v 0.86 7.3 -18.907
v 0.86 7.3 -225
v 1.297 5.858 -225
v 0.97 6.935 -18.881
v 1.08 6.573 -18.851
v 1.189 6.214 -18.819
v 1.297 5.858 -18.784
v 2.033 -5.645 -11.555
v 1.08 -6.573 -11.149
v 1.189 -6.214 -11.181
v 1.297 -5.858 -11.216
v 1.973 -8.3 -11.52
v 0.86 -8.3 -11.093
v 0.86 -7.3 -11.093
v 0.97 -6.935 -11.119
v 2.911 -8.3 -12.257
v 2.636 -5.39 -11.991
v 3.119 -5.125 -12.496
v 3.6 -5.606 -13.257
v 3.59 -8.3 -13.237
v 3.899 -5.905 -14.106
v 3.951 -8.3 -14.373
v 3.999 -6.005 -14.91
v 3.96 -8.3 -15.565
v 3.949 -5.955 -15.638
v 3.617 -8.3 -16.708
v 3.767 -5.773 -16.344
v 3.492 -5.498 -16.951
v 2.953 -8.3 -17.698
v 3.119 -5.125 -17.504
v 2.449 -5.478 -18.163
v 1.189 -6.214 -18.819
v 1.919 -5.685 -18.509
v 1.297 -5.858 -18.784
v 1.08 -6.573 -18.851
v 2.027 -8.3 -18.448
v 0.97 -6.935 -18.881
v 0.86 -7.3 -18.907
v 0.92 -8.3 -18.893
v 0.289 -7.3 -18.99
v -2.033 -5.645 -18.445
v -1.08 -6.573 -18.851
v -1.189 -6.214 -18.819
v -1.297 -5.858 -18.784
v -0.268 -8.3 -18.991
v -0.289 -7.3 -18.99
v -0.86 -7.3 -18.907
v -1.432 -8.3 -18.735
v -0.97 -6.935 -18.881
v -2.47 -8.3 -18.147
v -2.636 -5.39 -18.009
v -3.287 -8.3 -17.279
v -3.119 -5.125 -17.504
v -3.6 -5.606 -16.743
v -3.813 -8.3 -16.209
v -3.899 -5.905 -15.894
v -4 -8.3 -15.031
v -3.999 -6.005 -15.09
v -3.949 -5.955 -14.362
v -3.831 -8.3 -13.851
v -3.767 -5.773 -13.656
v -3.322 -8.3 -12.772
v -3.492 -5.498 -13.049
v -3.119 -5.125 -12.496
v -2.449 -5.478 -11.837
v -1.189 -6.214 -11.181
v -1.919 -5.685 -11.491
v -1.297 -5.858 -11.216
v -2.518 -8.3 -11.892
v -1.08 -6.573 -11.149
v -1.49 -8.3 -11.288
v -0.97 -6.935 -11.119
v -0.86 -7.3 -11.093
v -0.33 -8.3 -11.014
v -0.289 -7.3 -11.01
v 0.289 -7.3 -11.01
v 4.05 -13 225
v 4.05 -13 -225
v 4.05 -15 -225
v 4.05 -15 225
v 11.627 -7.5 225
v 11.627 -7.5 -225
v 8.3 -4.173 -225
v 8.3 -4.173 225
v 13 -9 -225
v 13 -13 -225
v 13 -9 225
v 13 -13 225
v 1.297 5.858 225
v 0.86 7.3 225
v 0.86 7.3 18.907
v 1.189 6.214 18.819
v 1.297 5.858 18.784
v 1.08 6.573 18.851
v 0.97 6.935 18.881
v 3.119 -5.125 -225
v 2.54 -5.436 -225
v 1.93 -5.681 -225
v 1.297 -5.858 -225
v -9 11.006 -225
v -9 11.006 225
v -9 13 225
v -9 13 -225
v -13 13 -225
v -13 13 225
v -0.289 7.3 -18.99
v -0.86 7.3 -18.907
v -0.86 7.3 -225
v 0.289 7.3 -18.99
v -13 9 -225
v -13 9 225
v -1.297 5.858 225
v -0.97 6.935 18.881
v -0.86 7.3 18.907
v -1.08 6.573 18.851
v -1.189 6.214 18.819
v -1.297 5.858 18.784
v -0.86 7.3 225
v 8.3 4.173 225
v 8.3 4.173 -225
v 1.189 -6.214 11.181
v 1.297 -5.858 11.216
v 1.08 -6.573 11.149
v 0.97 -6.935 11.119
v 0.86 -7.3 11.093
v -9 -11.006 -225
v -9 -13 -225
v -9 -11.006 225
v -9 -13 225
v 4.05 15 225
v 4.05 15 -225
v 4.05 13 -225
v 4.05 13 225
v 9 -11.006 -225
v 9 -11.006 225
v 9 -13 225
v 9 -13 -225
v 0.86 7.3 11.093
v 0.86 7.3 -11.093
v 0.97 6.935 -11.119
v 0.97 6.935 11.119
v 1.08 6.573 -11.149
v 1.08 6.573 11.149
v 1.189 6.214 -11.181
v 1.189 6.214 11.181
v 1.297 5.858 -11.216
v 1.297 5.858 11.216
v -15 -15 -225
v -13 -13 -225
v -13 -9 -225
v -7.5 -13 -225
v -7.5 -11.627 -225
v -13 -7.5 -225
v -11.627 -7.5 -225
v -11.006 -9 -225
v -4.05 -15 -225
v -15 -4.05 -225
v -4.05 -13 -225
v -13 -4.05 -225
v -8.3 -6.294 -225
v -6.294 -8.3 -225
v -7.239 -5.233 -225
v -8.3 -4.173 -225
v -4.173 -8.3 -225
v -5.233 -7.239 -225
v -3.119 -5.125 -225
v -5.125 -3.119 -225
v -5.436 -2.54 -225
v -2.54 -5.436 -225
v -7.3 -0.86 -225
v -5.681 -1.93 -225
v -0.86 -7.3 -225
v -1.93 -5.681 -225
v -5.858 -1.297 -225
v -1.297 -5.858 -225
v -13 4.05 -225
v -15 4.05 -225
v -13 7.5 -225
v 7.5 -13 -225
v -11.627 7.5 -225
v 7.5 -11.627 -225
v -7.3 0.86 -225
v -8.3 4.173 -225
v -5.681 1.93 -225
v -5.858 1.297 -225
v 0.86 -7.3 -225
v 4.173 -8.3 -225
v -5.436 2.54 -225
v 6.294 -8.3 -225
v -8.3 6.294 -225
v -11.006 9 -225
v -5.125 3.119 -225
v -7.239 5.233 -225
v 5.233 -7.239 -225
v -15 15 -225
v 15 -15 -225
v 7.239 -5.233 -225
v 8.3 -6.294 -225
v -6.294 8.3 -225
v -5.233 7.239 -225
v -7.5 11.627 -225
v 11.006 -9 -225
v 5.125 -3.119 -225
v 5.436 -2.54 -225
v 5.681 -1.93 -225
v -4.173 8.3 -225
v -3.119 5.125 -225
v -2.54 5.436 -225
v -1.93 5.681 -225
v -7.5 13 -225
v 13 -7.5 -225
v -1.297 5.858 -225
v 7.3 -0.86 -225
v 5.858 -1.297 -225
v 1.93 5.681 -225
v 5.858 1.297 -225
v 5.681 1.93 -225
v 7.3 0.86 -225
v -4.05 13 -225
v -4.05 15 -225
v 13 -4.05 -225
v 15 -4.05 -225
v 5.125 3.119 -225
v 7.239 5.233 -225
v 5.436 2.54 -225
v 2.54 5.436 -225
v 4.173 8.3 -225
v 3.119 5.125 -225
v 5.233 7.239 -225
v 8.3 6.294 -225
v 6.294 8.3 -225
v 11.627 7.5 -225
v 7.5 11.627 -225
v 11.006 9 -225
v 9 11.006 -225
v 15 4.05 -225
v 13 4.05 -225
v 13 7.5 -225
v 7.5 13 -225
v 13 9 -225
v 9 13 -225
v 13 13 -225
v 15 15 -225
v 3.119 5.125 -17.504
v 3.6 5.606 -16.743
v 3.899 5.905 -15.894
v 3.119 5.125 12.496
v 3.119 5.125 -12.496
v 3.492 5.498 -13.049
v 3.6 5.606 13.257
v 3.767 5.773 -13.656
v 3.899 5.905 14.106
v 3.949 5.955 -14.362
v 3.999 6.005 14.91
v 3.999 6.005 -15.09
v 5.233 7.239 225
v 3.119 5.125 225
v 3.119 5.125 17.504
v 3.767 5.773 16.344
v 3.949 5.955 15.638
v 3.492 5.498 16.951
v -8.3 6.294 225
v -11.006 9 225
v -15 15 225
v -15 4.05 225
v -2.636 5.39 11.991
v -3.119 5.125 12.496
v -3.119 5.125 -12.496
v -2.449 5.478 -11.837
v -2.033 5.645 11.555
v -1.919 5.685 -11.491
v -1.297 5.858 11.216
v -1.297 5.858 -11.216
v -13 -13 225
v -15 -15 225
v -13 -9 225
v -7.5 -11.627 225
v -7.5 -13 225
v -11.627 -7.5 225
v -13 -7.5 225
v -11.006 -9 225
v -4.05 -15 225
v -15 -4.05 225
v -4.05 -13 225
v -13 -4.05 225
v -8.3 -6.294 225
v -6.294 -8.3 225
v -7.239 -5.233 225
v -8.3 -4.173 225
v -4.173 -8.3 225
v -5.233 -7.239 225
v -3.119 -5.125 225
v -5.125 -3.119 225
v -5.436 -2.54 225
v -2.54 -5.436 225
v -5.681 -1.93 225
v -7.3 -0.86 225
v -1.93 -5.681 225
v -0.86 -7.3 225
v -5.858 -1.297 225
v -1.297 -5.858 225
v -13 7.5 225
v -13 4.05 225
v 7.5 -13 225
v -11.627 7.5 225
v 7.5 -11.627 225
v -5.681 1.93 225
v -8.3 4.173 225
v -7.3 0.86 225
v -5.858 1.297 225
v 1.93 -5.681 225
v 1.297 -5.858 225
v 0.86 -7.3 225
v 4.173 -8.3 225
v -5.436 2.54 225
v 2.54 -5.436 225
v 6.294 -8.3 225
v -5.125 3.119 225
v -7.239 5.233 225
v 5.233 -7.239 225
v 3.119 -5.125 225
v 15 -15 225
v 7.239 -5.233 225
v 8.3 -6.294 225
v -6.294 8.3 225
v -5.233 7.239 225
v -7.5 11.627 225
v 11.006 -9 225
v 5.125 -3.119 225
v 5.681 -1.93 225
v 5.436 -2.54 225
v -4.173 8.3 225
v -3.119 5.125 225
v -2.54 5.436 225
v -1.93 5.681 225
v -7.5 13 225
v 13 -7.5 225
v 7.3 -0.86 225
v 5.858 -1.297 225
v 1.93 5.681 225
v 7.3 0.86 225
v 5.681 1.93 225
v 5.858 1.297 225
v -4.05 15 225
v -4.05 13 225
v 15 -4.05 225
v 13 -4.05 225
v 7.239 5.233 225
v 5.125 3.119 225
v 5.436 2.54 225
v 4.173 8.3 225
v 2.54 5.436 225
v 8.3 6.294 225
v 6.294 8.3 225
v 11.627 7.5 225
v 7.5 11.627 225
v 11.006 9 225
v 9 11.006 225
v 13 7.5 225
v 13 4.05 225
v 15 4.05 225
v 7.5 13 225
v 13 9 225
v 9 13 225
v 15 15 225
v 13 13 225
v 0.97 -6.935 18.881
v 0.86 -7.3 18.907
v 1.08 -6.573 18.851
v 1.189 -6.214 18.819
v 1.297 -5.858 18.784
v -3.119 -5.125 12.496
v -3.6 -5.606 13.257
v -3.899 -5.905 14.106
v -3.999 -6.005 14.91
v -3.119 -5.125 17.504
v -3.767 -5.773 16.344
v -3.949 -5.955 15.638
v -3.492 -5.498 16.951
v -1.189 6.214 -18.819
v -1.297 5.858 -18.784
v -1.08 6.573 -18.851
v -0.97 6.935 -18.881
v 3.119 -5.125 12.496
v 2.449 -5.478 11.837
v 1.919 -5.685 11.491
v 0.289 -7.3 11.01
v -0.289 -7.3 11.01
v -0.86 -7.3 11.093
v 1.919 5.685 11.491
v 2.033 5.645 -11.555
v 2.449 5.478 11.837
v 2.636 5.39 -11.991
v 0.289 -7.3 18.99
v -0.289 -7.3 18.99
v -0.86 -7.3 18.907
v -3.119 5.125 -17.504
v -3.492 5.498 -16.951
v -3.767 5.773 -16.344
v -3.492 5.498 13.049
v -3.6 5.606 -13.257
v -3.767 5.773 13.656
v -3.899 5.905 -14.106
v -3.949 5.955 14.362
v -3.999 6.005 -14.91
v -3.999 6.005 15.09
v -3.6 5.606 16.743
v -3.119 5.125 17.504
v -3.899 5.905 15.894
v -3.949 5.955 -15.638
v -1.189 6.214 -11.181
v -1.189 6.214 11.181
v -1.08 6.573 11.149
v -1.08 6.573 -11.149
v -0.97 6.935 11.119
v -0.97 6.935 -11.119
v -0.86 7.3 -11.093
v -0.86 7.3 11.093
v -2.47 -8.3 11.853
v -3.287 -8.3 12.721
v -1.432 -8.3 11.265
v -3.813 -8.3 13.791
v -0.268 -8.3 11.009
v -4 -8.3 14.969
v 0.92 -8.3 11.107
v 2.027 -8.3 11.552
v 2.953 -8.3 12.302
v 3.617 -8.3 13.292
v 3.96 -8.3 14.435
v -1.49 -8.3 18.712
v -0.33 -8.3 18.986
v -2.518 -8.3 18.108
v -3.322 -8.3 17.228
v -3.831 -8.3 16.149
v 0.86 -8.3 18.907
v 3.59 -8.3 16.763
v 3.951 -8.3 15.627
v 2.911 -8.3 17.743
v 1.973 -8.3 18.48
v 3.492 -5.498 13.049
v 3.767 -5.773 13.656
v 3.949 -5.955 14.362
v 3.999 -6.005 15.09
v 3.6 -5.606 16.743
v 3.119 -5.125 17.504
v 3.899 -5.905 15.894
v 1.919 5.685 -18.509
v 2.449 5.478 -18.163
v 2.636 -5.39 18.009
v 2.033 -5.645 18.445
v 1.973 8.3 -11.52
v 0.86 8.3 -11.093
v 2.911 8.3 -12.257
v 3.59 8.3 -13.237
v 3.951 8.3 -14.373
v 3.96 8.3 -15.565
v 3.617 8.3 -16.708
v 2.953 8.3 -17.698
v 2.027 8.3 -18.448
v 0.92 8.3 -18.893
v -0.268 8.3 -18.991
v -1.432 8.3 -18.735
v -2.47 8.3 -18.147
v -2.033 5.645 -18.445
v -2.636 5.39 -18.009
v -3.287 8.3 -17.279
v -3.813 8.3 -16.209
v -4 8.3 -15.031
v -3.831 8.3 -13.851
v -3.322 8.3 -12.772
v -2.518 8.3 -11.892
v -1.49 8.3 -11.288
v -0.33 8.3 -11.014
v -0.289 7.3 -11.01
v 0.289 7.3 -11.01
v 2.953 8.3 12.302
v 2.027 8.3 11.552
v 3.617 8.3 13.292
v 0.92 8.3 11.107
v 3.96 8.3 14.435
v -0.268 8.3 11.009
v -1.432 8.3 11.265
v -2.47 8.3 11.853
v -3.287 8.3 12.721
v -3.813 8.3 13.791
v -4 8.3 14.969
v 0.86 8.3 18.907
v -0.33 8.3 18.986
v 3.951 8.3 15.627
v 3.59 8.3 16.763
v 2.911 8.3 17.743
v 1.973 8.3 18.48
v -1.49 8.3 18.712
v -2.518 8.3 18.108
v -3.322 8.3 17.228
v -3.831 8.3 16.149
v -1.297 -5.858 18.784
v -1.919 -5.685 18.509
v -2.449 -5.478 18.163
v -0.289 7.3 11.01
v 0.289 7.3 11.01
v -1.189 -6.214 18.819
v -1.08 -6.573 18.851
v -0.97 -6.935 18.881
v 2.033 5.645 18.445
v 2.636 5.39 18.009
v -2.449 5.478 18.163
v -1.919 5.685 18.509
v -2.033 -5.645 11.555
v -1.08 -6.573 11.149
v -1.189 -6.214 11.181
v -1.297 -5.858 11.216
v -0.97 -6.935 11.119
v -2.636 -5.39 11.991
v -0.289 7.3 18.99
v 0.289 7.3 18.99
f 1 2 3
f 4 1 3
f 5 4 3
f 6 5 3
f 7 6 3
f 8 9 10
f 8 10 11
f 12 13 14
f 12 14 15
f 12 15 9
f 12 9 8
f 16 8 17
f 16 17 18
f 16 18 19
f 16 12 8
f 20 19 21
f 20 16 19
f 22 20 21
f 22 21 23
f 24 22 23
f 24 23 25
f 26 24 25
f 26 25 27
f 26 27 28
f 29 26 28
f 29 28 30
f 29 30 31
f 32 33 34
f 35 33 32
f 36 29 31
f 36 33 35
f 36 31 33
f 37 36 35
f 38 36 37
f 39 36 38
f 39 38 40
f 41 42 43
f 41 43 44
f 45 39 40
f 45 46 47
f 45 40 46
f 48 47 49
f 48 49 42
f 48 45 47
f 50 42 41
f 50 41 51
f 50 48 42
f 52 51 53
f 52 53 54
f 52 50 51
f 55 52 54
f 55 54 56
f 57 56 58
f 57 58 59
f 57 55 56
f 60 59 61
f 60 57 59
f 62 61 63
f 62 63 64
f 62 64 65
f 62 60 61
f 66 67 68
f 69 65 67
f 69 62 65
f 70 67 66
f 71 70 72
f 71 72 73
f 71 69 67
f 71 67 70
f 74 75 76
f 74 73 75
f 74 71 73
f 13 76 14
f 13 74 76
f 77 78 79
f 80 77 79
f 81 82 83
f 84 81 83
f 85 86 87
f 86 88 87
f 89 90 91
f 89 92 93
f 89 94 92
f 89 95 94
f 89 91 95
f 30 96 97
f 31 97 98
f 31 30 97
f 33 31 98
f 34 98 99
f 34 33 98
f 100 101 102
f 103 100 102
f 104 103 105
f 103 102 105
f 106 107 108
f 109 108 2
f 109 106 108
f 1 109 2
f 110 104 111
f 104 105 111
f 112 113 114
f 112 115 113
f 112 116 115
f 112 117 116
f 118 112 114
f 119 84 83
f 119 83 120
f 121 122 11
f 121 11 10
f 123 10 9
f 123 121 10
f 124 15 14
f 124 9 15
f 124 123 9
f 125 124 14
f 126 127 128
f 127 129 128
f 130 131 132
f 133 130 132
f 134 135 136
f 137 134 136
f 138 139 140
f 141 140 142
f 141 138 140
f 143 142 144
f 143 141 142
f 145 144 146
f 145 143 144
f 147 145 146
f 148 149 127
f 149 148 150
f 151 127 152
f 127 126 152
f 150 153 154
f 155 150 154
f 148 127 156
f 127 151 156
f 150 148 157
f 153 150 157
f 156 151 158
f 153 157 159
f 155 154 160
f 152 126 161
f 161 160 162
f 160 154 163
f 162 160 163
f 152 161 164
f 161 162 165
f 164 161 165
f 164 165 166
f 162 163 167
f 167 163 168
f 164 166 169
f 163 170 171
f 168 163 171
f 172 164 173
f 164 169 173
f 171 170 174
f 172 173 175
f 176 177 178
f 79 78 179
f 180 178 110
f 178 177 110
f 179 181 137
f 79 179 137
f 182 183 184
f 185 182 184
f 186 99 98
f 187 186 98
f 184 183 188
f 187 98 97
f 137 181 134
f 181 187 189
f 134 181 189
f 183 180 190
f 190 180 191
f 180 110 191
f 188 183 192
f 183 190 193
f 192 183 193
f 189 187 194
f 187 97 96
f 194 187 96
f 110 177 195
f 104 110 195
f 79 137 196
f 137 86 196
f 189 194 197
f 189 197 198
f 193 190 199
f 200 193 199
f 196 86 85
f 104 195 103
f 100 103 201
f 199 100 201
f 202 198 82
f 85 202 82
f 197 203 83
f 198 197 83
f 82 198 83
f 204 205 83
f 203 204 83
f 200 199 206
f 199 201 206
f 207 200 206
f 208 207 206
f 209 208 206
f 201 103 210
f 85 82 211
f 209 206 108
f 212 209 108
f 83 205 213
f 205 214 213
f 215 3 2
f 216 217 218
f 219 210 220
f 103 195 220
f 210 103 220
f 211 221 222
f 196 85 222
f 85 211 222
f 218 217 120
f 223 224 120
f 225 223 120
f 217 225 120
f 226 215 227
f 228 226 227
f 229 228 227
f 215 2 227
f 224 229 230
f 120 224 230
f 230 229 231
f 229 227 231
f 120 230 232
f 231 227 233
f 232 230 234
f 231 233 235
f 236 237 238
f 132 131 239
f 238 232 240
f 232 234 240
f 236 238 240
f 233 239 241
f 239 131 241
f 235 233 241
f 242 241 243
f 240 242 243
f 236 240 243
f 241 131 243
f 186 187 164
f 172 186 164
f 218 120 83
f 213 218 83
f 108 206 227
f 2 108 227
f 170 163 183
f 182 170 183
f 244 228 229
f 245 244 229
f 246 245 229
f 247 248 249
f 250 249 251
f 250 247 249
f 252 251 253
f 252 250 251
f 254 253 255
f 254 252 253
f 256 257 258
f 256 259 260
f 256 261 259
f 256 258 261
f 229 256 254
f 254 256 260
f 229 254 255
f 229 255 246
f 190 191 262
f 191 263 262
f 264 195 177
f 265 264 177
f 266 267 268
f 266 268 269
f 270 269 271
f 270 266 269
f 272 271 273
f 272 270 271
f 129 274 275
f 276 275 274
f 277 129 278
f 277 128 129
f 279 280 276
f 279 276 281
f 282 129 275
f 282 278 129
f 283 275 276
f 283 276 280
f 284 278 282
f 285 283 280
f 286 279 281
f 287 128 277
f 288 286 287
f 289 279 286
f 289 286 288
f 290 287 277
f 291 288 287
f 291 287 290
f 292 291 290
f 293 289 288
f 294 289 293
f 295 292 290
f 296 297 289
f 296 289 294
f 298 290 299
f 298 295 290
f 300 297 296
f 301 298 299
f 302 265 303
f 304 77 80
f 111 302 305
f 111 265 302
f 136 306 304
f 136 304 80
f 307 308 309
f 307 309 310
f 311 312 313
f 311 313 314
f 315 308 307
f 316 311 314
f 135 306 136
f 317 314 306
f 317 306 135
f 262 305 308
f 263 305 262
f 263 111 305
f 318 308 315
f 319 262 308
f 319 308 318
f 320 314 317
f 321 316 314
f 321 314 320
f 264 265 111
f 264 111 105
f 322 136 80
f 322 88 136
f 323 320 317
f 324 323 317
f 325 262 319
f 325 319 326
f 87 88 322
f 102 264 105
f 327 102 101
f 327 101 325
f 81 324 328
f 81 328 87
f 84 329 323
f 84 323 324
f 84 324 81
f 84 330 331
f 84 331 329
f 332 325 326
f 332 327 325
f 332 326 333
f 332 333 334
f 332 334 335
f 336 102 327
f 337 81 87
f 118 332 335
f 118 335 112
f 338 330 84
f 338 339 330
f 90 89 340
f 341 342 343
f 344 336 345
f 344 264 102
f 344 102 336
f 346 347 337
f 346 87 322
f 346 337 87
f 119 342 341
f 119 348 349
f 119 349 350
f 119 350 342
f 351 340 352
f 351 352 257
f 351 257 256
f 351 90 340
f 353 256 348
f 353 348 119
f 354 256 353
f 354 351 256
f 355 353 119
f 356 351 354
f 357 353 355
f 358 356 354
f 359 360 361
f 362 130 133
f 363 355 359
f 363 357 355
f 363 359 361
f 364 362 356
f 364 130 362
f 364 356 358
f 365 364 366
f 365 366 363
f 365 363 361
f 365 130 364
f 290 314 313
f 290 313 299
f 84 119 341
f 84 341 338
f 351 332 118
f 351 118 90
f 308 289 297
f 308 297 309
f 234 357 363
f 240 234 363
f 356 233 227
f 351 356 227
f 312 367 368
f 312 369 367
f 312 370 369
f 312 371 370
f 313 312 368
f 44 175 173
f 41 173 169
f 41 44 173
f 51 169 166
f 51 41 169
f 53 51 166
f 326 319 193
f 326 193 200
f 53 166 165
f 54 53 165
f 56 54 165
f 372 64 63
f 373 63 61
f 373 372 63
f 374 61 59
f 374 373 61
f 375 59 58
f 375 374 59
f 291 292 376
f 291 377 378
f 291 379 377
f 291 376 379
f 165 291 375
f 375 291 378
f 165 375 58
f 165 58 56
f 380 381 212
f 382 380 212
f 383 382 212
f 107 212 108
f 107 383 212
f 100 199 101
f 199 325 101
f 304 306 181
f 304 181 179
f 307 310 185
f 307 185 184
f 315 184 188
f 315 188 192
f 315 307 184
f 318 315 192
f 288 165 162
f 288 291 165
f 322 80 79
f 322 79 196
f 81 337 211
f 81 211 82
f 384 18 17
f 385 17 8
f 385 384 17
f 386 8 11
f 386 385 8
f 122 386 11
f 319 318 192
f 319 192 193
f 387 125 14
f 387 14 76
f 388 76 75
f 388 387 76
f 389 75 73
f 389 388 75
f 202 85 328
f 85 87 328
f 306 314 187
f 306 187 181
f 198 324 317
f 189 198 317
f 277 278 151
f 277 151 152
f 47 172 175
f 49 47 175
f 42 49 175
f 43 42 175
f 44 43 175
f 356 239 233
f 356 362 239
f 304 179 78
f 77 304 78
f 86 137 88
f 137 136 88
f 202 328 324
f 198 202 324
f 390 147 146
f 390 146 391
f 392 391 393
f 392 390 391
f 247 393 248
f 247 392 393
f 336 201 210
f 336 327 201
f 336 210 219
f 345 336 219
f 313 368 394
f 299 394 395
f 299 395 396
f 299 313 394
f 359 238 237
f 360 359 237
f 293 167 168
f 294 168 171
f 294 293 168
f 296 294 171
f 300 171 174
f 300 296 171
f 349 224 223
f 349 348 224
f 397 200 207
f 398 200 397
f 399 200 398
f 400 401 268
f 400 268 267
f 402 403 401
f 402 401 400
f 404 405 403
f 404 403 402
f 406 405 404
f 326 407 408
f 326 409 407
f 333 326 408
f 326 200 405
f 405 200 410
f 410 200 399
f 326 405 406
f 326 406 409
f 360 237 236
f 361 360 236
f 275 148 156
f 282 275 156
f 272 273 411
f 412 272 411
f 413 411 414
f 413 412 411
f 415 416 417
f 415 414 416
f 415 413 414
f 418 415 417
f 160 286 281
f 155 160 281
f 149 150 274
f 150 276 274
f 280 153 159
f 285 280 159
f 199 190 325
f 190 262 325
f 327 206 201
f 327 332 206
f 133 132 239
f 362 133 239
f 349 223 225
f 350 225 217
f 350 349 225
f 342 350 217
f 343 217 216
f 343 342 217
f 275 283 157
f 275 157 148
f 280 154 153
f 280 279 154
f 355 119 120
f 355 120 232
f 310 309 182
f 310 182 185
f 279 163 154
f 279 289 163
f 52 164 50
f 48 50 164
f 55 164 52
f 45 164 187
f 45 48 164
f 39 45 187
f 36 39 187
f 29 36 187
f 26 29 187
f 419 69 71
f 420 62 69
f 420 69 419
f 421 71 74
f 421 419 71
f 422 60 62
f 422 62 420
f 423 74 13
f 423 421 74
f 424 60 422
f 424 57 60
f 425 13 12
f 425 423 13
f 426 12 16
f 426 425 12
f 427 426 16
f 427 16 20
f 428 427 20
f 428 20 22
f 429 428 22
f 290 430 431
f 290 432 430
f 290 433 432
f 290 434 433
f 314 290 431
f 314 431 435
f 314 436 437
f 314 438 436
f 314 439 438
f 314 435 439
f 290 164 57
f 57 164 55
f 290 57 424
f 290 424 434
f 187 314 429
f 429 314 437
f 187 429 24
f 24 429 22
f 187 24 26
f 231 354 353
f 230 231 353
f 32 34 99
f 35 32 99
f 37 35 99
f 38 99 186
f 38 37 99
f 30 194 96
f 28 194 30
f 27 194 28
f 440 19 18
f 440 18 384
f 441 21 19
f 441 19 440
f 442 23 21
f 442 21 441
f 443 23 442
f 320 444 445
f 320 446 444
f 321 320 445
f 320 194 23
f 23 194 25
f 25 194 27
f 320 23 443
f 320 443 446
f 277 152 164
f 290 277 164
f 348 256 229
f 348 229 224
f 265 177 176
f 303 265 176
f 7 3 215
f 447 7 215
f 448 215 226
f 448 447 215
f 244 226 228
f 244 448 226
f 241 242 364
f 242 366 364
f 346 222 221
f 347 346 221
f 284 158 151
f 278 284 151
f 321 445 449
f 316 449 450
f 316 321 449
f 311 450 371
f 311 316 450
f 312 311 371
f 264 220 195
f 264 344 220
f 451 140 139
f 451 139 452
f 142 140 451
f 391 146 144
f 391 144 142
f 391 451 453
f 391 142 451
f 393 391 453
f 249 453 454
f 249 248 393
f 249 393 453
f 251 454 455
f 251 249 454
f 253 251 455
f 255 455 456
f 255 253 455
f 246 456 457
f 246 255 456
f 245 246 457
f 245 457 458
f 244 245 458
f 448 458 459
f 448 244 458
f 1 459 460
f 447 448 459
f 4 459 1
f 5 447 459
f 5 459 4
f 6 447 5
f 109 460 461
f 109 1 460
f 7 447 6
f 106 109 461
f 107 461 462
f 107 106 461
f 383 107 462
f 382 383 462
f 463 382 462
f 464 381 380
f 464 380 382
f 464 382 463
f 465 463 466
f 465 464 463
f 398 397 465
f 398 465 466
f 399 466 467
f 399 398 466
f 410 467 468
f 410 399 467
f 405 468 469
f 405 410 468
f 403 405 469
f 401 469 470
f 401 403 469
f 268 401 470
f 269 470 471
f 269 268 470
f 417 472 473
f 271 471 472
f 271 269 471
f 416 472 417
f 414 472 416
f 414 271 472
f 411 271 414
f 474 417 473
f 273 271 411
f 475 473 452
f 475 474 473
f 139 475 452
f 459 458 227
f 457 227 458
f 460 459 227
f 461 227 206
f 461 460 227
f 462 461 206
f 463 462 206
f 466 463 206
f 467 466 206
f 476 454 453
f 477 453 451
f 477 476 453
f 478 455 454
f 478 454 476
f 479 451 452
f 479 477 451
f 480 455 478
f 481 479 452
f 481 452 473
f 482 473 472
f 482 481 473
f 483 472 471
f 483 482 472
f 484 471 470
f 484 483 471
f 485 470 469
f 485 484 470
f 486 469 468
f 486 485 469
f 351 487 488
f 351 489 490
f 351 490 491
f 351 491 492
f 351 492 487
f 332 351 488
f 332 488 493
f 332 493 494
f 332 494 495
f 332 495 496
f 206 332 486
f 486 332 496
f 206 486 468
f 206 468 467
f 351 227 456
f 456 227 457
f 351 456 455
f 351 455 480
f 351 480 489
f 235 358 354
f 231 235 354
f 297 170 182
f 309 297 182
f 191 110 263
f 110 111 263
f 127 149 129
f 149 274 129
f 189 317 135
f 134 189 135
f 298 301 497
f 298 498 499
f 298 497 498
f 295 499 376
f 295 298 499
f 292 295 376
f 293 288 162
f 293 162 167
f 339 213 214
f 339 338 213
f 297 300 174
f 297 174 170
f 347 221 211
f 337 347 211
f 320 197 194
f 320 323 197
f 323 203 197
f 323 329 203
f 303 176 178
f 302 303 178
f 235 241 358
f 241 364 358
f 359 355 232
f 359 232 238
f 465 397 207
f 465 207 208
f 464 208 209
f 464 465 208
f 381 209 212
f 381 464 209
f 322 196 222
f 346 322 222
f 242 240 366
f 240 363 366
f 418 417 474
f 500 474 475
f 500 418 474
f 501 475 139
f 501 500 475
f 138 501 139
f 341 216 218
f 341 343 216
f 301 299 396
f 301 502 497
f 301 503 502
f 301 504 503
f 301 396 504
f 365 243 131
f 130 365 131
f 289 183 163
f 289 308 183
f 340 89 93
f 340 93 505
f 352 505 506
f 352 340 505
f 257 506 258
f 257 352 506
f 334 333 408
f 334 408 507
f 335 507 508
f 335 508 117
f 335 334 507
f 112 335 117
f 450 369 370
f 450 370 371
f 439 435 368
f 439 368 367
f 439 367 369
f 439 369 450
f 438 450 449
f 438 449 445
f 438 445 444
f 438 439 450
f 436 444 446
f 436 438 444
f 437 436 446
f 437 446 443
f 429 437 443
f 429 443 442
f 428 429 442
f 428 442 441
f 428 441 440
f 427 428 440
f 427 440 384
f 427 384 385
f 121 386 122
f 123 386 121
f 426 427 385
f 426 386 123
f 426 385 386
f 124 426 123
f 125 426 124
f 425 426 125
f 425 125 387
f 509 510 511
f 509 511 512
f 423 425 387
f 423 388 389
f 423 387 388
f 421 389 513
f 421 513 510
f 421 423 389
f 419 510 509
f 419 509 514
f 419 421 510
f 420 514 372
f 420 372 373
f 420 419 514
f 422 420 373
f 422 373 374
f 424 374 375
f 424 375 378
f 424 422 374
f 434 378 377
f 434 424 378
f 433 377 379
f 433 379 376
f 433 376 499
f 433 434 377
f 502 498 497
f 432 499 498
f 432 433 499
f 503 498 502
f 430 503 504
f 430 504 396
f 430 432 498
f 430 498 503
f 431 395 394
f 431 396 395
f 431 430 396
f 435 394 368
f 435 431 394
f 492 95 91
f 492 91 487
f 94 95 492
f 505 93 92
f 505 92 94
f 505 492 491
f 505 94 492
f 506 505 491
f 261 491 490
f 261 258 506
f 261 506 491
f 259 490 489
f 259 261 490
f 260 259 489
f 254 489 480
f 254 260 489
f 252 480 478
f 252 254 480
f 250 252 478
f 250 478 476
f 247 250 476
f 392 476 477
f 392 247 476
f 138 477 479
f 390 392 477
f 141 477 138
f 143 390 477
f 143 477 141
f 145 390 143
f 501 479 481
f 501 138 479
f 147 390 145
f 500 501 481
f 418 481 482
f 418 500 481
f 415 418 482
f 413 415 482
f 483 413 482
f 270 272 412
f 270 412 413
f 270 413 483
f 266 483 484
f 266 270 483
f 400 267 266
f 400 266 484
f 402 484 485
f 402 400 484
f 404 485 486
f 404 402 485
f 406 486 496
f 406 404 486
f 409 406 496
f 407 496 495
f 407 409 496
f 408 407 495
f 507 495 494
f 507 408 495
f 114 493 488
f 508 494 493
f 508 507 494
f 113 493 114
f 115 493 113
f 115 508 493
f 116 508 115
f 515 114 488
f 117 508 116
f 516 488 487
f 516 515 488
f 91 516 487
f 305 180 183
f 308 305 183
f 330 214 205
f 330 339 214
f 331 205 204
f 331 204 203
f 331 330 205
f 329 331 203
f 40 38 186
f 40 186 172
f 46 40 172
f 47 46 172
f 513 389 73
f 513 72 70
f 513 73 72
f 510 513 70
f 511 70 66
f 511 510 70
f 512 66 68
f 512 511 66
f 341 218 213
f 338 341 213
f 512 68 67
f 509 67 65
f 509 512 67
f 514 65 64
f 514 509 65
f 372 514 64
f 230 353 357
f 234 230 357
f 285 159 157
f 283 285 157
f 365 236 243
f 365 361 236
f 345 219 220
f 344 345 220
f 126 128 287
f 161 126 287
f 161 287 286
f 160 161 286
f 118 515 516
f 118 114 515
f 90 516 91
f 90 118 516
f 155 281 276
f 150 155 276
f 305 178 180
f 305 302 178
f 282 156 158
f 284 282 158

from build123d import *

# Parameters (mm, degrees)
RESSALTO_EXTRUS_O1_DEPTH   = 225
CORTE_EXTRUS_O1_DEPTH      = 226.9977876
CORTE_EXTRUS_O1_DEPTH_BACK = 226.9977876
ESBO_O2_R                  = 4


with BuildPart() as part:
    # Esboço1 → Ressalto-extrusão1 (new, symmetric)
    with BuildSketch(Plane.XY):
        Polygon((-13, -4.05), (-15, -4.05), (-15, -15), (-4.05, -15), (-4.05, -13), (-7.5, -13), (-7.5, -11.627272727), (-4.172727273, -8.3), (4.172727273, -8.3), (7.5, -11.627272727), (7.5, -13), (4.05, -13), (4.05, -15), (15, -15), (15, -4.05), (13, -4.05), (13, -7.5), (11.627272727, -7.5), (8.3, -4.172727273), (8.3, 4.172727273), (11.627272727, 7.5), (13, 7.5), (13, 4.05), (15, 4.05), (15, 15), (4.05, 15), (4.05, 13), (7.5, 13), (7.5, 11.627272727), (4.172727273, 8.3), (-4.172727273, 8.3), (-7.5, 11.627272727), (-7.5, 13), (-4.05, 13), (-4.05, 15), (-15, 15), (-15, 4.05), (-13, 4.05), (-13, 7.5), (-11.627272727, 7.5), (-8.3, 4.172727273), (-8.3, -4.172727273), (-11.627272727, -7.5), (-13, -7.5), align=None)
        with BuildLine():
            Line((-7.239339828, -5.233387445), (-5.125358847, -3.119406464))
            ThreePointArc((-5.125358847, -3.119406464), (-5.566897716, -2.238224702), (-5.858217272, -1.296645823))
            Line((-5.858217272, -1.296645823), (-7.3, -0.859788435))
            Line((-7.3, -0.859788435), (-7.3, 0.859788435))
            Line((-7.3, 0.859788435), (-5.858217272, 1.296645823))
            ThreePointArc((-5.858217272, 1.296645823), (-5.566897716, 2.238224702), (-5.125358847, 3.119406464))
            Line((-5.125358847, 3.119406464), (-7.239339828, 5.233387445))
            Line((-7.239339828, 5.233387445), (-5.233387445, 7.239339828))
            Line((-5.233387445, 7.239339828), (-3.119406464, 5.125358847))
            ThreePointArc((-3.119406464, 5.125358847), (-2.238224702, 5.566897716), (-1.296645823, 5.858217272))
            Line((-1.296645823, 5.858217272), (-0.859788435, 7.3))
            Line((-0.859788435, 7.3), (0.859788435, 7.3))
            Line((0.859788435, 7.3), (1.296645823, 5.858217272))
            ThreePointArc((1.296645823, 5.858217272), (2.238224702, 5.566897716), (3.119406464, 5.125358847))
            Line((3.119406464, 5.125358847), (5.233387445, 7.239339828))
            Line((5.233387445, 7.239339828), (7.239339828, 5.233387445))
            Line((7.239339828, 5.233387445), (5.125358847, 3.119406464))
            ThreePointArc((5.125358847, 3.119406464), (5.566897716, 2.238224702), (5.858217272, 1.296645823))
            Line((5.858217272, 1.296645823), (7.3, 0.859788435))
            Line((7.3, 0.859788435), (7.3, -0.859788435))
            Line((7.3, -0.859788435), (5.858217272, -1.296645823))
            ThreePointArc((5.858217272, -1.296645823), (5.566897716, -2.238224702), (5.125358847, -3.119406464))
            Line((5.125358847, -3.119406464), (7.239339828, -5.233387445))
            Line((7.239339828, -5.233387445), (5.233387445, -7.239339828))
            Line((5.233387445, -7.239339828), (3.119406464, -5.125358847))
            ThreePointArc((3.119406464, -5.125358847), (2.238224702, -5.566897716), (1.296645823, -5.858217272))
            Line((1.296645823, -5.858217272), (0.859788435, -7.3))
            Line((0.859788435, -7.3), (-0.859788435, -7.3))
            Line((-0.859788435, -7.3), (-1.296645823, -5.858217272))
            ThreePointArc((-1.296645823, -5.858217272), (-2.238224702, -5.566897716), (-3.119406464, -5.125358847))
            Line((-3.119406464, -5.125358847), (-5.233387445, -7.239339828))
            Line((-5.233387445, -7.239339828), (-7.239339828, -5.233387445))
        make_face(mode=Mode.SUBTRACT)
        Polygon((-11.005952384, -9), (-13, -9), (-13, -13), (-9, -13), (-9, -11.005952384), (-6.294047616, -8.3), (-8.3, -6.294047616), align=None, mode=Mode.SUBTRACT)
        Polygon((9, -11.005952384), (9, -13), (13, -13), (13, -9), (11.005952384, -9), (8.3, -6.294047616), (6.294047616, -8.3), align=None, mode=Mode.SUBTRACT)
        Polygon((11.005952384, 9), (13, 9), (13, 13), (9, 13), (9, 11.005952384), (6.294047616, 8.3), (8.3, 6.294047616), align=None, mode=Mode.SUBTRACT)
        Polygon((-9, 11.005952384), (-9, 13), (-13, 13), (-13, 9), (-11.005952384, 9), (-8.3, 6.294047616), (-6.294047616, 8.3), align=None, mode=Mode.SUBTRACT)
    extrude(amount=RESSALTO_EXTRUS_O1_DEPTH, both=True)

    # Esboço2 → Corte-extrusão1 (cut, two sides: drawn at the far end of the back side and taken through both)
    with BuildSketch(Plane(origin=(0, 0, 0), x_dir=(1, 0, 0), z_dir=(0, 1, 0)).offset(-CORTE_EXTRUS_O1_DEPTH_BACK)):
        with Locations(Location((0, -15, 0), (0, 0, 282.412424309))):
            Circle(ESBO_O2_R)
        with Locations(Location((0, 15, 0), (0, 0, 282.412424309))):
            Circle(ESBO_O2_R)
    extrude(amount=CORTE_EXTRUS_O1_DEPTH + CORTE_EXTRUS_O1_DEPTH_BACK, mode=Mode.SUBTRACT)


solid = part.part
